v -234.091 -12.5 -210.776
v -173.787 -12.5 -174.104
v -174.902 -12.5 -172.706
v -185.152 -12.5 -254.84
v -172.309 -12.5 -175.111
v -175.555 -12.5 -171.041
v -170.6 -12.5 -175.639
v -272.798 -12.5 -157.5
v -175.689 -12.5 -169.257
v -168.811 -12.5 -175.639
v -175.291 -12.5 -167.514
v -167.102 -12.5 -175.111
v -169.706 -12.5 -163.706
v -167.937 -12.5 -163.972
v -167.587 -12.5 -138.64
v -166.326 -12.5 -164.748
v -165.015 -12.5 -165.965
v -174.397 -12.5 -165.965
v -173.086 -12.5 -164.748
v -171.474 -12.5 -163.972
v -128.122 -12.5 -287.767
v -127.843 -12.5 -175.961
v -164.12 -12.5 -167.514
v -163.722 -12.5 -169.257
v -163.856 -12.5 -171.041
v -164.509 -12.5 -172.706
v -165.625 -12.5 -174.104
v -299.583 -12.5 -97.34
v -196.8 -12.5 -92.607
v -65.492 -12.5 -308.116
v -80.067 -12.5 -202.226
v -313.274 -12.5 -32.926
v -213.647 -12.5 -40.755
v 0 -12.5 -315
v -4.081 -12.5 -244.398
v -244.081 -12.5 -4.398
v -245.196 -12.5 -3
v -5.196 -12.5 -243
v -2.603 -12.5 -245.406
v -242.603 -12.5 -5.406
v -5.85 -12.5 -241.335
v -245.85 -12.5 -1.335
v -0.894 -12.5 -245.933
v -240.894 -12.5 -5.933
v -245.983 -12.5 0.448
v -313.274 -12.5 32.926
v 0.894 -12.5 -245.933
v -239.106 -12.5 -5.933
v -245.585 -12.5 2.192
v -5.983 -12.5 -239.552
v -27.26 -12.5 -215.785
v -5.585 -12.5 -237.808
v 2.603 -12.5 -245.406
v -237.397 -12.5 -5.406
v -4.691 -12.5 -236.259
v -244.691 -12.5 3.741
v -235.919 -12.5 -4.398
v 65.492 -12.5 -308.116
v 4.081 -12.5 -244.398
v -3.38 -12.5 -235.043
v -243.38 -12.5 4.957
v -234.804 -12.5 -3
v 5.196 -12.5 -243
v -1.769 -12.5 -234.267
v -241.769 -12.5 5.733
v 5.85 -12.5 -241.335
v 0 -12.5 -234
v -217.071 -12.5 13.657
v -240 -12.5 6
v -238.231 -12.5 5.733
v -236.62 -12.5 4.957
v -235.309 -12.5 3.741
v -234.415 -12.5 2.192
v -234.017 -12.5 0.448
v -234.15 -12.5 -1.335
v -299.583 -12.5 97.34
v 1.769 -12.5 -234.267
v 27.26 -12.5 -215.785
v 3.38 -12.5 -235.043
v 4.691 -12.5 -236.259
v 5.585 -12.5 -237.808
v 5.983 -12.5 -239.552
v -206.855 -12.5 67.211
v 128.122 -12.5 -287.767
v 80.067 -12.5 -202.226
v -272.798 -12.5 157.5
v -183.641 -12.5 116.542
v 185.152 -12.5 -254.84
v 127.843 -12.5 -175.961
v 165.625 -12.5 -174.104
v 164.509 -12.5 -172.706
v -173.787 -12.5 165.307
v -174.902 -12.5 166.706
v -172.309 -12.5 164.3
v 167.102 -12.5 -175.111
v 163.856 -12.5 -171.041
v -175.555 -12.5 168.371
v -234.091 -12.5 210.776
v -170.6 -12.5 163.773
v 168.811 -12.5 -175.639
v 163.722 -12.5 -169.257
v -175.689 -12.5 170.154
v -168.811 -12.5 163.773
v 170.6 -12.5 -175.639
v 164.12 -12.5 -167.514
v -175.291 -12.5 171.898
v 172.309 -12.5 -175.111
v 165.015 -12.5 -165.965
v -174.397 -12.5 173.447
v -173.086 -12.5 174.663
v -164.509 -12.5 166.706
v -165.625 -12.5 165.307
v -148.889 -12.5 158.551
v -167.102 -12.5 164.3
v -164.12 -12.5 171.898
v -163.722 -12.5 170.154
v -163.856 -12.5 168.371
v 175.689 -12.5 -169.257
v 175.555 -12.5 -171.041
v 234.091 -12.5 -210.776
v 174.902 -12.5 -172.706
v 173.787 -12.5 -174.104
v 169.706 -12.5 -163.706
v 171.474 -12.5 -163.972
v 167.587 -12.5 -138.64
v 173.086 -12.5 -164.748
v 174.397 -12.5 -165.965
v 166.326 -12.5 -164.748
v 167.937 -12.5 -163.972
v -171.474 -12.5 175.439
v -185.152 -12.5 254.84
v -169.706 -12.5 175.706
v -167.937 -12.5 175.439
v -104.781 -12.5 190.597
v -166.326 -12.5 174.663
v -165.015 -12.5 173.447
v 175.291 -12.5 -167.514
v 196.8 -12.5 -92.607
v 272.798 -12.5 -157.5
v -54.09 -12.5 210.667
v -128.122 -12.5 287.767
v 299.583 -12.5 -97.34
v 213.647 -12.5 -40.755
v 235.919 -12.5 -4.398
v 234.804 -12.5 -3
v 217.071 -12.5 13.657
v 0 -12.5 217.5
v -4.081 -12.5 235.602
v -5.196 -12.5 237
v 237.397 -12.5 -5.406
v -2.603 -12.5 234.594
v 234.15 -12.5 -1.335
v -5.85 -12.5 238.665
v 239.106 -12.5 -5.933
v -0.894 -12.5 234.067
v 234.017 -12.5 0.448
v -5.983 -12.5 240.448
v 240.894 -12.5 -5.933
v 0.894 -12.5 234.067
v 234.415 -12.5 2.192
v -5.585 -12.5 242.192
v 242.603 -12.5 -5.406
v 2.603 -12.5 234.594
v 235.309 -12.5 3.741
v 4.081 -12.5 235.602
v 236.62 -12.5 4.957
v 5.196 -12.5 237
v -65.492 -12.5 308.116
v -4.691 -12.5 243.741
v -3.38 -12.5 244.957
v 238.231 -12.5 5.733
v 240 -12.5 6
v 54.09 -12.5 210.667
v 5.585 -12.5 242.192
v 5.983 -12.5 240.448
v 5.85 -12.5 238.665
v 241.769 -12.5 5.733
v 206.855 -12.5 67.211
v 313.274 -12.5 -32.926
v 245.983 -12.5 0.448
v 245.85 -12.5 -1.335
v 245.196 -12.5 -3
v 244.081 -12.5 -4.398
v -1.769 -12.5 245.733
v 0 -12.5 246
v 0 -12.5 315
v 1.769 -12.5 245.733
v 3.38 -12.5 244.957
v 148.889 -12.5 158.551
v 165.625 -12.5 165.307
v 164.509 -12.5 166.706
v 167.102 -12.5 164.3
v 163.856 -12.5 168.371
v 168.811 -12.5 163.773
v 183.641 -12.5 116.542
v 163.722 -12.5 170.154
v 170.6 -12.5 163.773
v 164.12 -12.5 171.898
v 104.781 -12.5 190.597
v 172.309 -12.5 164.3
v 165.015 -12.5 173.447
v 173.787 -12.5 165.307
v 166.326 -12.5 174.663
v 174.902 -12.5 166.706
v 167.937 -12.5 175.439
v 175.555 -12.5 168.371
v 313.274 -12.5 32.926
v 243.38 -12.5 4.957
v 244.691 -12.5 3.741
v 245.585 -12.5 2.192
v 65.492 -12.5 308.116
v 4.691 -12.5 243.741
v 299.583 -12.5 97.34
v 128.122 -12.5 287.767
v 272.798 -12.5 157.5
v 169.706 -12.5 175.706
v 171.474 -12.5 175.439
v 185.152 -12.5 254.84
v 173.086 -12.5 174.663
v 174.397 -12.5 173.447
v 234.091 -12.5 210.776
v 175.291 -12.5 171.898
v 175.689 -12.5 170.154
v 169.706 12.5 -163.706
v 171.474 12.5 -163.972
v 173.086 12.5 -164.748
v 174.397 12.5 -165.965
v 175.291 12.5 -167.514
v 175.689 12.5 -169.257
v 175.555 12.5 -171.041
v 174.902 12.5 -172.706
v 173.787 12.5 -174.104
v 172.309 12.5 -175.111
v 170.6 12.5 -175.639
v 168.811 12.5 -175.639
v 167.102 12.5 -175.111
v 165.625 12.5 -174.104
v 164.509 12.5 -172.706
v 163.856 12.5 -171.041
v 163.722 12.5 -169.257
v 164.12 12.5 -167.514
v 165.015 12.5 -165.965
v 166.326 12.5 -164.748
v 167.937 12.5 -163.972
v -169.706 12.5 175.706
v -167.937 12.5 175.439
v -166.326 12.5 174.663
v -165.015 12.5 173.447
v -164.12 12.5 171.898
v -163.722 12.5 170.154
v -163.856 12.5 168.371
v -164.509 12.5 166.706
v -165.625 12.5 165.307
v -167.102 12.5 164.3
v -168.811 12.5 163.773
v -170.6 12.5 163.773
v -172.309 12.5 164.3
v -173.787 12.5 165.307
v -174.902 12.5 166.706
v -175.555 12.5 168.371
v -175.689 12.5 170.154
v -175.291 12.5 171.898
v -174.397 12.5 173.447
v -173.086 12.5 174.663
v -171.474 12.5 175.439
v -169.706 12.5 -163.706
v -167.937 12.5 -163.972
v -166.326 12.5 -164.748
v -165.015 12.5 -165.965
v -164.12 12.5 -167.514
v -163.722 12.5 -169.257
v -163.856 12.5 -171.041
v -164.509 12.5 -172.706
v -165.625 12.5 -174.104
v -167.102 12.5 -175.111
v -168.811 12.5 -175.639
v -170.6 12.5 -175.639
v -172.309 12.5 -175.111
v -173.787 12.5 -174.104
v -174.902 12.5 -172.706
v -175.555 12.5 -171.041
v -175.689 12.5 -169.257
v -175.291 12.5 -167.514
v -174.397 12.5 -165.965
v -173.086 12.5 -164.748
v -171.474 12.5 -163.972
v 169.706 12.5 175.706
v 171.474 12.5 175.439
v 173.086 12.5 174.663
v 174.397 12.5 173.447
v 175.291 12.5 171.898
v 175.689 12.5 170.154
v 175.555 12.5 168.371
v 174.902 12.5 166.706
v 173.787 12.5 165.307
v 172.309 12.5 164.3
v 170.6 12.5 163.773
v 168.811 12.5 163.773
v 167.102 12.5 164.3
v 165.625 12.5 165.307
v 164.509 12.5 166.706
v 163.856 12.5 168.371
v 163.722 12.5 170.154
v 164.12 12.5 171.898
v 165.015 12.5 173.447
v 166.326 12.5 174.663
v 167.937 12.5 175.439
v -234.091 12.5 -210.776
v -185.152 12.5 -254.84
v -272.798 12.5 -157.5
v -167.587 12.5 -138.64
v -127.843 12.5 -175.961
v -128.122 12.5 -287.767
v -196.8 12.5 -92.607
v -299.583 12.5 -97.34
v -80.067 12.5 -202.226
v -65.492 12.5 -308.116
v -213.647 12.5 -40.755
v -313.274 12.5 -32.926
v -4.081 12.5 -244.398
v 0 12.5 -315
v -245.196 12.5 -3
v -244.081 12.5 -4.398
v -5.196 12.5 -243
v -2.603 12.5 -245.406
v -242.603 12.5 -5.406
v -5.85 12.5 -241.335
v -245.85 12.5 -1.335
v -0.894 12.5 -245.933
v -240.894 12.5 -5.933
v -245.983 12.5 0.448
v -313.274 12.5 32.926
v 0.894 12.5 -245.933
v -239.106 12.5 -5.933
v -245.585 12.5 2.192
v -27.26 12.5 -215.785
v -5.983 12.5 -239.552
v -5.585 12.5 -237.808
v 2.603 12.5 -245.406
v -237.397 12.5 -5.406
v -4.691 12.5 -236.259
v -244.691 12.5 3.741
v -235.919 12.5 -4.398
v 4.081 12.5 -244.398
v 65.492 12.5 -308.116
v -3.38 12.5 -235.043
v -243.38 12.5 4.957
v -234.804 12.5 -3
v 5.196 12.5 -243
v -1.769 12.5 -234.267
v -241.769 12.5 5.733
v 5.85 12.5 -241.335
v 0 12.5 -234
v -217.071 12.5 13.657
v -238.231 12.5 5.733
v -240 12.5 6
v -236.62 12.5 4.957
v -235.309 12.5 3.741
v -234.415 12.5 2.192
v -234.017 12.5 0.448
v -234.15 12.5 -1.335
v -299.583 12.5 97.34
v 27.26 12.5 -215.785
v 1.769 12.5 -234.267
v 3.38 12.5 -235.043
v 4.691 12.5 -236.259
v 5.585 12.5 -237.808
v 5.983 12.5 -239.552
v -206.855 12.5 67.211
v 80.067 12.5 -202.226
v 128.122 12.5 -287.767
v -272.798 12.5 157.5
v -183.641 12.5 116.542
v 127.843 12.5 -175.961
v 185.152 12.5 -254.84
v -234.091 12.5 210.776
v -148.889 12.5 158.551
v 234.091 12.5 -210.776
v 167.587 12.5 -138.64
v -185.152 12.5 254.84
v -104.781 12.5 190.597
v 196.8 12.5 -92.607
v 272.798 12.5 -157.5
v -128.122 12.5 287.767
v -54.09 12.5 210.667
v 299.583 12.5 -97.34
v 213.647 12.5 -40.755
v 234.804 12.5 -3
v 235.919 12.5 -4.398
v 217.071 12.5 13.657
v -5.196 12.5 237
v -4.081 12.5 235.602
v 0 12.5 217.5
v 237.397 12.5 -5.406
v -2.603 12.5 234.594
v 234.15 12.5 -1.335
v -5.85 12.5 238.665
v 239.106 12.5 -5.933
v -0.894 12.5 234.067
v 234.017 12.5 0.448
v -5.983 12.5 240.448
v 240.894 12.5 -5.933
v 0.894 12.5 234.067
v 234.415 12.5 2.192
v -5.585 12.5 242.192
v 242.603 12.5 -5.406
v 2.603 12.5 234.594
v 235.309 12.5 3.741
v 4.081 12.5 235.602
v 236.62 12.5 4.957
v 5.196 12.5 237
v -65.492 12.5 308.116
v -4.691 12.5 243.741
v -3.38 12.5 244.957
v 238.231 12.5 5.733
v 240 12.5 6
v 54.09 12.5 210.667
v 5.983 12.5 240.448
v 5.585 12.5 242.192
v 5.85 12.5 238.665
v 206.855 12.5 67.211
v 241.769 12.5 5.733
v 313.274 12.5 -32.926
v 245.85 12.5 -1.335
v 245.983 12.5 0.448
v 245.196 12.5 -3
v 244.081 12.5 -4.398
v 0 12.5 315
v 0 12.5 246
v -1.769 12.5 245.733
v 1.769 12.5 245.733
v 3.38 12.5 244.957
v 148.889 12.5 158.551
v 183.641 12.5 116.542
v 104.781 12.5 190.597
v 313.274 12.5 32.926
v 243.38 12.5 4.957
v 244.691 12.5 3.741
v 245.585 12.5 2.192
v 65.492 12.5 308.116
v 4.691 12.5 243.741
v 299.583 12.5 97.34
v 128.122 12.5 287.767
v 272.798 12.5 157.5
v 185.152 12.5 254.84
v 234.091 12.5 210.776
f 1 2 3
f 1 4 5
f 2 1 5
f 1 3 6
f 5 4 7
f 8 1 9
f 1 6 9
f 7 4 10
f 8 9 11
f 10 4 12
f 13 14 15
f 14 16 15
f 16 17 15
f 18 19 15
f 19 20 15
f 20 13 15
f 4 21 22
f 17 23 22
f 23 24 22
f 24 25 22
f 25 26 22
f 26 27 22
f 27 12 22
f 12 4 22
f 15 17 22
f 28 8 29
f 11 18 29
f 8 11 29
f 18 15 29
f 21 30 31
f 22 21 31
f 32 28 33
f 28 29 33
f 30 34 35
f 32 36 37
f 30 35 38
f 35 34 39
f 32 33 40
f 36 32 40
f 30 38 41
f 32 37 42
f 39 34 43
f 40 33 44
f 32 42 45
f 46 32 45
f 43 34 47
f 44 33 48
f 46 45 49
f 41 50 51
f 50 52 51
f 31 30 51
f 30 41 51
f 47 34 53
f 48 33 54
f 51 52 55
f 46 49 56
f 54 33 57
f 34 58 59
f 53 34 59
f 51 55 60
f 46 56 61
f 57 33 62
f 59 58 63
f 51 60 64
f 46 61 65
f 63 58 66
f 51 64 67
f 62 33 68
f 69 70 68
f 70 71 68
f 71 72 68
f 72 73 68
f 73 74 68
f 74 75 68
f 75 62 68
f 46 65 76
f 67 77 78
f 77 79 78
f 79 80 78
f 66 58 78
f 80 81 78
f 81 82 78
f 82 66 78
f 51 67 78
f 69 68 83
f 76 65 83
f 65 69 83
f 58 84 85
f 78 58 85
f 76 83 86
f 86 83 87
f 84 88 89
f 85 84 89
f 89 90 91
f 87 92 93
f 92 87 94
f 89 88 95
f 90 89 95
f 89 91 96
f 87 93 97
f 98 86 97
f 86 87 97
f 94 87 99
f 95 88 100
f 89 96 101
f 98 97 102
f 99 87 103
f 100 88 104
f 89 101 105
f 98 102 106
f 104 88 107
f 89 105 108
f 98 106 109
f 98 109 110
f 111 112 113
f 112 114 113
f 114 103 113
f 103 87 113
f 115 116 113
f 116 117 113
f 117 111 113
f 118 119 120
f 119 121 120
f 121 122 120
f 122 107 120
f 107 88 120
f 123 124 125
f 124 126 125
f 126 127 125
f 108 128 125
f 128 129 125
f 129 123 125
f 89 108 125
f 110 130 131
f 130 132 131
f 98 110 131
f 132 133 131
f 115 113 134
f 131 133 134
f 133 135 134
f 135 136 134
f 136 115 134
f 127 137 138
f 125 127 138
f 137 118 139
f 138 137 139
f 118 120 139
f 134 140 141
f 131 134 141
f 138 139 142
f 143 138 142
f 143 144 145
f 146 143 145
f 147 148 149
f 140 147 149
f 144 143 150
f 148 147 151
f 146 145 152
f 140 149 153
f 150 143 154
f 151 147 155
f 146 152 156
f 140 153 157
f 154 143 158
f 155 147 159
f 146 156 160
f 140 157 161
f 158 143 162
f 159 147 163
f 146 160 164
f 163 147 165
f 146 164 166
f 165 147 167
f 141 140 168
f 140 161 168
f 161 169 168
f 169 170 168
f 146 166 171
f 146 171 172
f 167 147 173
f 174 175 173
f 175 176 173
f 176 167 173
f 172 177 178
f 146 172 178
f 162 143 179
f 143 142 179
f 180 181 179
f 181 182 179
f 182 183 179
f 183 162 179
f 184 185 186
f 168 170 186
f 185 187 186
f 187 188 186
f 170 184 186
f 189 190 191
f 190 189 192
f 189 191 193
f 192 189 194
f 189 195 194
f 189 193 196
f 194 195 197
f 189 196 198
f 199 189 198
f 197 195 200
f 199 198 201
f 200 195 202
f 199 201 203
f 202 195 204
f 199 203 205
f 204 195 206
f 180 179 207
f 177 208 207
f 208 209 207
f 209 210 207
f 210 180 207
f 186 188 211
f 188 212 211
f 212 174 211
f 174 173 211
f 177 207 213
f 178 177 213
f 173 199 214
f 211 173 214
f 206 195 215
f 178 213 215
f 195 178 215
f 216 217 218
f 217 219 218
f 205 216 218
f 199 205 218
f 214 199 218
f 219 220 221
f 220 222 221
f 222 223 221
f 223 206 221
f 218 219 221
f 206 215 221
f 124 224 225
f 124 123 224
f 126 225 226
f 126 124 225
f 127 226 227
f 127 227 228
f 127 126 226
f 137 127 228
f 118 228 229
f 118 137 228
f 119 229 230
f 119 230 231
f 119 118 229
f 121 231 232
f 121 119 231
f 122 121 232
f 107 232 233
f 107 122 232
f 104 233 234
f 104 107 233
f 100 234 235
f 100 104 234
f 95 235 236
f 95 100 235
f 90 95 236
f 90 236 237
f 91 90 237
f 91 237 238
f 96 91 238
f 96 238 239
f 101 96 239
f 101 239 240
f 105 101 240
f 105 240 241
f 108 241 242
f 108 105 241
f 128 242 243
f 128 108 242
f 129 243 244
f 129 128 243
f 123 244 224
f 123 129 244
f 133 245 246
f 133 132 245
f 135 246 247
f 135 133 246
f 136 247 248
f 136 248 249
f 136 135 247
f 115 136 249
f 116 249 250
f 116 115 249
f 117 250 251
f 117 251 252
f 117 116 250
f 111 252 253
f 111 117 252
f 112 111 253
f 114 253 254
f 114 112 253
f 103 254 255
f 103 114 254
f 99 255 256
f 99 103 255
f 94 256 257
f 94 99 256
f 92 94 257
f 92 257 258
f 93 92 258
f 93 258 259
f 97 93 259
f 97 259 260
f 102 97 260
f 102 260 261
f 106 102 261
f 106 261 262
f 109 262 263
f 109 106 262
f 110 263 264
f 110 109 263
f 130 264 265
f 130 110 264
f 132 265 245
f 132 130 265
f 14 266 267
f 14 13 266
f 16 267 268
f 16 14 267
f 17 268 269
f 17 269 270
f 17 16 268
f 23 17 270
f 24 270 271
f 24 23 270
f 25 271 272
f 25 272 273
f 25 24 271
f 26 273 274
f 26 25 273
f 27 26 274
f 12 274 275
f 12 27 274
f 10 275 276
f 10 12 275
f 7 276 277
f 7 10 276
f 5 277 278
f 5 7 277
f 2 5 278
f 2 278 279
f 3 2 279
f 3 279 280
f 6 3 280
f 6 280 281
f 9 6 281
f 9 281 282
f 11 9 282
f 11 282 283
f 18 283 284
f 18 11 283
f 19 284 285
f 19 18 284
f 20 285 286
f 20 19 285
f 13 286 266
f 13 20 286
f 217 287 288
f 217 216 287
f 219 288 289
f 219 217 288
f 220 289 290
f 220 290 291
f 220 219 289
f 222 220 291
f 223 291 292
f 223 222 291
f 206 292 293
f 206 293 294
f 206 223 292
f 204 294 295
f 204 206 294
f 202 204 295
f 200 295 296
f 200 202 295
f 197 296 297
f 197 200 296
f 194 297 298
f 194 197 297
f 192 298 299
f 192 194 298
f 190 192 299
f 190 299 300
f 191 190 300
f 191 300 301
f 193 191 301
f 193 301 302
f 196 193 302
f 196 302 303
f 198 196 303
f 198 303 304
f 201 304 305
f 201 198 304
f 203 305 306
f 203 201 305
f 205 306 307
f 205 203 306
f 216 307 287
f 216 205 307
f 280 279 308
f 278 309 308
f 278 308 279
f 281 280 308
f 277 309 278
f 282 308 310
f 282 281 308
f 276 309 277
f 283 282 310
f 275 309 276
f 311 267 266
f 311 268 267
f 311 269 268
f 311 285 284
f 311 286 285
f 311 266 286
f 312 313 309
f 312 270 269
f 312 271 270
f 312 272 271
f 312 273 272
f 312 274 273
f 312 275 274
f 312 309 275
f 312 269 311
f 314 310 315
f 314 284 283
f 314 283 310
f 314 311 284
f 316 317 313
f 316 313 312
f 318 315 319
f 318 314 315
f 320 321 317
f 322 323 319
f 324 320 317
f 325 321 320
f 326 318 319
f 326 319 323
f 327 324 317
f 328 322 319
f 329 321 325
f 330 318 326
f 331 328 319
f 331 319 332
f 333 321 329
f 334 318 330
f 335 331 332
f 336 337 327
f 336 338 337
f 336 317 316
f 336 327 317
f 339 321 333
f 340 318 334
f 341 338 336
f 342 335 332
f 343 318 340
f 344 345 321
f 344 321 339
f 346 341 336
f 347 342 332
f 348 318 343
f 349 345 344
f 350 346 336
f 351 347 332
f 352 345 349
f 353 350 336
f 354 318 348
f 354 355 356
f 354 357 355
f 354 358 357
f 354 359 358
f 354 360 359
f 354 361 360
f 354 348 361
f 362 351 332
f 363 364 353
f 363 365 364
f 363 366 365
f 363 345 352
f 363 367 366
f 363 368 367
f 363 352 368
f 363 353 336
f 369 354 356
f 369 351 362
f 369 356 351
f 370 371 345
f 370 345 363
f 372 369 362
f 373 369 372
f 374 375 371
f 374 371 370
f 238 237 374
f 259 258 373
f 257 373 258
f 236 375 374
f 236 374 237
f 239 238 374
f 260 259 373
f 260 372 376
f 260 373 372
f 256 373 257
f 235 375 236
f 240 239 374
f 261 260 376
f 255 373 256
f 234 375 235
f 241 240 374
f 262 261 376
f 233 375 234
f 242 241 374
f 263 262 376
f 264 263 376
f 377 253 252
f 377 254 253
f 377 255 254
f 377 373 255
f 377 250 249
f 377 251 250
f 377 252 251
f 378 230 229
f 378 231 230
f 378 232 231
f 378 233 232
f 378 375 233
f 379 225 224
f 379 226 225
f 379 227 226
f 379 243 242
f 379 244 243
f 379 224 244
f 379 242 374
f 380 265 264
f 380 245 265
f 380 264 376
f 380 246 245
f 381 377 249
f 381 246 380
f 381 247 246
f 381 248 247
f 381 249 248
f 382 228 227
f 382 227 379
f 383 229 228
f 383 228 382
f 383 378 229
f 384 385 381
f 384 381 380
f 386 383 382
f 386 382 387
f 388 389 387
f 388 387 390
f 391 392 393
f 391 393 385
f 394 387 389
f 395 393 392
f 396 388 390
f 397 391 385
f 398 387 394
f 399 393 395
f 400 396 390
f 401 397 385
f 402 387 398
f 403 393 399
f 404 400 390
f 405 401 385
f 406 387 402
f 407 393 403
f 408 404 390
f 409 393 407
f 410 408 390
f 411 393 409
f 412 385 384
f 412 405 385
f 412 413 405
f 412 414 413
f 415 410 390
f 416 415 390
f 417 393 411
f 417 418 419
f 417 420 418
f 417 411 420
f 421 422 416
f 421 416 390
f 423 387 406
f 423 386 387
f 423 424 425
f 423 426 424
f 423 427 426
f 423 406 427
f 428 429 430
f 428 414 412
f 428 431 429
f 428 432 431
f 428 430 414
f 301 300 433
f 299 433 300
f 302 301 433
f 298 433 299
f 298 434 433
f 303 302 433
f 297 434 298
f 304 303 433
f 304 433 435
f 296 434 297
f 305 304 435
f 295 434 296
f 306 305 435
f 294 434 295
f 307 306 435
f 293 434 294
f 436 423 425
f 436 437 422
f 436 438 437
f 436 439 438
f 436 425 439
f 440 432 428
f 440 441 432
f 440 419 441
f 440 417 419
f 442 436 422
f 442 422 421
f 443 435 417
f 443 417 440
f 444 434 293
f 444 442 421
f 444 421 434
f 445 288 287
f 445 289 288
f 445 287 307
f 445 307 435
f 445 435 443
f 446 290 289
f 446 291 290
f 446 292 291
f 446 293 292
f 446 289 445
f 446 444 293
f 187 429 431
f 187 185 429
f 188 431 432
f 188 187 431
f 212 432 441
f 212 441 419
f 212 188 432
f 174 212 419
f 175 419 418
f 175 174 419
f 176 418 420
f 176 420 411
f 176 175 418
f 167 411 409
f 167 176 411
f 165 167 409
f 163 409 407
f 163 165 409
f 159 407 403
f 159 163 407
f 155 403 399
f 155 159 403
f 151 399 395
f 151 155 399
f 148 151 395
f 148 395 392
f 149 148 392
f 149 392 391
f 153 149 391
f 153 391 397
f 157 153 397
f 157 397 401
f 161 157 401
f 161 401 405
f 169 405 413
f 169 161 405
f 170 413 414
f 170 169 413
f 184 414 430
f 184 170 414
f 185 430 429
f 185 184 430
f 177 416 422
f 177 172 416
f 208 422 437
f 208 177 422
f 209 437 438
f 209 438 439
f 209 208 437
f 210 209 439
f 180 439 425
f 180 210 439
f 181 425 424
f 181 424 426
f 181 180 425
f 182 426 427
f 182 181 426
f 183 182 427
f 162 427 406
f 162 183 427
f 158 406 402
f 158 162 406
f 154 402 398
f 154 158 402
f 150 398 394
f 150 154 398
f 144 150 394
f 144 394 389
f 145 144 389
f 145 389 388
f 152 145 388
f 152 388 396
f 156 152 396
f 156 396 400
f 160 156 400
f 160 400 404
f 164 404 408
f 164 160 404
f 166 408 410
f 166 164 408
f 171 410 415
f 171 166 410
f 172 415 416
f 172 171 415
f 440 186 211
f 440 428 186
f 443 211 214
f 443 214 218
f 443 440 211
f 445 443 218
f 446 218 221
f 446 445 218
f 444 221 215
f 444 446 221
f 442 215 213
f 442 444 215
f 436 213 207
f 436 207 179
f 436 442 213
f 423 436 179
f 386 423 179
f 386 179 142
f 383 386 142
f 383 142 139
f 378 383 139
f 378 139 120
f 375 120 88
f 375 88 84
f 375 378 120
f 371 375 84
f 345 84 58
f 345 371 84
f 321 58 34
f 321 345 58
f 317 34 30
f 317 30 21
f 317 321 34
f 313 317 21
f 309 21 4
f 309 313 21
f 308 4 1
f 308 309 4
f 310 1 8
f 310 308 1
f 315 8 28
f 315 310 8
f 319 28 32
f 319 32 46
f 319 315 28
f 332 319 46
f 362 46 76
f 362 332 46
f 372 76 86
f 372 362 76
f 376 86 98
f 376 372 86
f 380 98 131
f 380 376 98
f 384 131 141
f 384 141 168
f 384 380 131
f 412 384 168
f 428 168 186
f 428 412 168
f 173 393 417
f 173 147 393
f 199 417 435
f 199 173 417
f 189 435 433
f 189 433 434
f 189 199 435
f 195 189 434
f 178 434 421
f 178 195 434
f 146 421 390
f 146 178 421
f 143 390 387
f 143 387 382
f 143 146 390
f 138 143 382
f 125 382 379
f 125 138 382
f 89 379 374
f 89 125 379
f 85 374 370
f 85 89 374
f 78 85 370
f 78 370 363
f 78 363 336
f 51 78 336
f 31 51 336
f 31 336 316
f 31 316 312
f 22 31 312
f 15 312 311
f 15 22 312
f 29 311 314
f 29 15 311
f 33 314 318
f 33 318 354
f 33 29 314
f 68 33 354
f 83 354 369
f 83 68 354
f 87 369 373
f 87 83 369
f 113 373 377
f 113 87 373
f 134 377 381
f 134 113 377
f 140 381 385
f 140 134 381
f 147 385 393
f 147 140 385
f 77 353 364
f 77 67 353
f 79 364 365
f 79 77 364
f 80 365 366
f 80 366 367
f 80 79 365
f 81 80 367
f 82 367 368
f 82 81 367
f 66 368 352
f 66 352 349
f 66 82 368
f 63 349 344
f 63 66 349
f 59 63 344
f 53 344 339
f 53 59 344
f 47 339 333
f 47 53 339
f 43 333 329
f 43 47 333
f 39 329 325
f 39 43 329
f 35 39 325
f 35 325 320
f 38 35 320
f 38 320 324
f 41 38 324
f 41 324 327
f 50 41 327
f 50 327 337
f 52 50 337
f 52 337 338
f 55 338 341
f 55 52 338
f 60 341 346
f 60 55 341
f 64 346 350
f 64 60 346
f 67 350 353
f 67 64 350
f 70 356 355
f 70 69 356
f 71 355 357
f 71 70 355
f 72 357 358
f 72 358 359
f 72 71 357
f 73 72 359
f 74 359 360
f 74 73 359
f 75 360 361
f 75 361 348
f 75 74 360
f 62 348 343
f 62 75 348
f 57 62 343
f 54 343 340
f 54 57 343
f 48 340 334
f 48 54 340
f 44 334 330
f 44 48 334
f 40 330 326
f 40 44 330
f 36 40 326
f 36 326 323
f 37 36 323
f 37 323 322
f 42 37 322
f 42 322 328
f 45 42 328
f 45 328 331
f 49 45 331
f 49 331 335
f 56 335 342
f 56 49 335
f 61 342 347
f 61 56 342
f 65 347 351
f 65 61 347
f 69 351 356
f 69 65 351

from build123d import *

# Parameters (mm, degrees)
SKETCH1_R           = 315
SKETCH1_R_2         = 217.5
SKETCH1_R_3         = 6
BOSS_EXTRUDE1_DEPTH = 12.5


with BuildPart() as part:
    # Sketch1 → Boss-Extrude1 (new, symmetric)
    with BuildSketch(Plane(origin=(0, 0, 0), x_dir=(1, 0, 0), z_dir=(0, 1, 0))):
        with Locations(Location((0, 0, 0), (0, 0, 270))):
            Circle(SKETCH1_R)
        with Locations(Location((0, 0, 0), (0, 0, 270))):
            Circle(SKETCH1_R_2, mode=Mode.SUBTRACT)
        with Locations(Location((0, 240, 0), (0, 0, 270))):
            Circle(SKETCH1_R_3, mode=Mode.SUBTRACT)
        with Locations(Location((169.705627485, 169.705627485, 0), (0, 0, 270))):
            Circle(SKETCH1_R_3, mode=Mode.SUBTRACT)
        with Locations(Location((240, 0, 0), (0, 0, 270))):
            Circle(SKETCH1_R_3, mode=Mode.SUBTRACT)
        with Locations(Location((169.705627485, -169.705627485, 0), (0, 0, 270))):
            Circle(SKETCH1_R_3, mode=Mode.SUBTRACT)
        with Locations(Location((0, -240, 0), (0, 0, 270))):
            Circle(SKETCH1_R_3, mode=Mode.SUBTRACT)
        with Locations(Location((-169.705627485, -169.705627485, 0), (0, 0, 270))):
            Circle(SKETCH1_R_3, mode=Mode.SUBTRACT)
        with Locations(Location((-240, 0, 0), (0, 0, 270))):
            Circle(SKETCH1_R_3, mode=Mode.SUBTRACT)
        with Locations(Location((-169.705627485, 169.705627485, 0), (0, 0, 270))):
            Circle(SKETCH1_R_3, mode=Mode.SUBTRACT)
    extrude(amount=BOSS_EXTRUDE1_DEPTH, both=True)


solid = part.part
